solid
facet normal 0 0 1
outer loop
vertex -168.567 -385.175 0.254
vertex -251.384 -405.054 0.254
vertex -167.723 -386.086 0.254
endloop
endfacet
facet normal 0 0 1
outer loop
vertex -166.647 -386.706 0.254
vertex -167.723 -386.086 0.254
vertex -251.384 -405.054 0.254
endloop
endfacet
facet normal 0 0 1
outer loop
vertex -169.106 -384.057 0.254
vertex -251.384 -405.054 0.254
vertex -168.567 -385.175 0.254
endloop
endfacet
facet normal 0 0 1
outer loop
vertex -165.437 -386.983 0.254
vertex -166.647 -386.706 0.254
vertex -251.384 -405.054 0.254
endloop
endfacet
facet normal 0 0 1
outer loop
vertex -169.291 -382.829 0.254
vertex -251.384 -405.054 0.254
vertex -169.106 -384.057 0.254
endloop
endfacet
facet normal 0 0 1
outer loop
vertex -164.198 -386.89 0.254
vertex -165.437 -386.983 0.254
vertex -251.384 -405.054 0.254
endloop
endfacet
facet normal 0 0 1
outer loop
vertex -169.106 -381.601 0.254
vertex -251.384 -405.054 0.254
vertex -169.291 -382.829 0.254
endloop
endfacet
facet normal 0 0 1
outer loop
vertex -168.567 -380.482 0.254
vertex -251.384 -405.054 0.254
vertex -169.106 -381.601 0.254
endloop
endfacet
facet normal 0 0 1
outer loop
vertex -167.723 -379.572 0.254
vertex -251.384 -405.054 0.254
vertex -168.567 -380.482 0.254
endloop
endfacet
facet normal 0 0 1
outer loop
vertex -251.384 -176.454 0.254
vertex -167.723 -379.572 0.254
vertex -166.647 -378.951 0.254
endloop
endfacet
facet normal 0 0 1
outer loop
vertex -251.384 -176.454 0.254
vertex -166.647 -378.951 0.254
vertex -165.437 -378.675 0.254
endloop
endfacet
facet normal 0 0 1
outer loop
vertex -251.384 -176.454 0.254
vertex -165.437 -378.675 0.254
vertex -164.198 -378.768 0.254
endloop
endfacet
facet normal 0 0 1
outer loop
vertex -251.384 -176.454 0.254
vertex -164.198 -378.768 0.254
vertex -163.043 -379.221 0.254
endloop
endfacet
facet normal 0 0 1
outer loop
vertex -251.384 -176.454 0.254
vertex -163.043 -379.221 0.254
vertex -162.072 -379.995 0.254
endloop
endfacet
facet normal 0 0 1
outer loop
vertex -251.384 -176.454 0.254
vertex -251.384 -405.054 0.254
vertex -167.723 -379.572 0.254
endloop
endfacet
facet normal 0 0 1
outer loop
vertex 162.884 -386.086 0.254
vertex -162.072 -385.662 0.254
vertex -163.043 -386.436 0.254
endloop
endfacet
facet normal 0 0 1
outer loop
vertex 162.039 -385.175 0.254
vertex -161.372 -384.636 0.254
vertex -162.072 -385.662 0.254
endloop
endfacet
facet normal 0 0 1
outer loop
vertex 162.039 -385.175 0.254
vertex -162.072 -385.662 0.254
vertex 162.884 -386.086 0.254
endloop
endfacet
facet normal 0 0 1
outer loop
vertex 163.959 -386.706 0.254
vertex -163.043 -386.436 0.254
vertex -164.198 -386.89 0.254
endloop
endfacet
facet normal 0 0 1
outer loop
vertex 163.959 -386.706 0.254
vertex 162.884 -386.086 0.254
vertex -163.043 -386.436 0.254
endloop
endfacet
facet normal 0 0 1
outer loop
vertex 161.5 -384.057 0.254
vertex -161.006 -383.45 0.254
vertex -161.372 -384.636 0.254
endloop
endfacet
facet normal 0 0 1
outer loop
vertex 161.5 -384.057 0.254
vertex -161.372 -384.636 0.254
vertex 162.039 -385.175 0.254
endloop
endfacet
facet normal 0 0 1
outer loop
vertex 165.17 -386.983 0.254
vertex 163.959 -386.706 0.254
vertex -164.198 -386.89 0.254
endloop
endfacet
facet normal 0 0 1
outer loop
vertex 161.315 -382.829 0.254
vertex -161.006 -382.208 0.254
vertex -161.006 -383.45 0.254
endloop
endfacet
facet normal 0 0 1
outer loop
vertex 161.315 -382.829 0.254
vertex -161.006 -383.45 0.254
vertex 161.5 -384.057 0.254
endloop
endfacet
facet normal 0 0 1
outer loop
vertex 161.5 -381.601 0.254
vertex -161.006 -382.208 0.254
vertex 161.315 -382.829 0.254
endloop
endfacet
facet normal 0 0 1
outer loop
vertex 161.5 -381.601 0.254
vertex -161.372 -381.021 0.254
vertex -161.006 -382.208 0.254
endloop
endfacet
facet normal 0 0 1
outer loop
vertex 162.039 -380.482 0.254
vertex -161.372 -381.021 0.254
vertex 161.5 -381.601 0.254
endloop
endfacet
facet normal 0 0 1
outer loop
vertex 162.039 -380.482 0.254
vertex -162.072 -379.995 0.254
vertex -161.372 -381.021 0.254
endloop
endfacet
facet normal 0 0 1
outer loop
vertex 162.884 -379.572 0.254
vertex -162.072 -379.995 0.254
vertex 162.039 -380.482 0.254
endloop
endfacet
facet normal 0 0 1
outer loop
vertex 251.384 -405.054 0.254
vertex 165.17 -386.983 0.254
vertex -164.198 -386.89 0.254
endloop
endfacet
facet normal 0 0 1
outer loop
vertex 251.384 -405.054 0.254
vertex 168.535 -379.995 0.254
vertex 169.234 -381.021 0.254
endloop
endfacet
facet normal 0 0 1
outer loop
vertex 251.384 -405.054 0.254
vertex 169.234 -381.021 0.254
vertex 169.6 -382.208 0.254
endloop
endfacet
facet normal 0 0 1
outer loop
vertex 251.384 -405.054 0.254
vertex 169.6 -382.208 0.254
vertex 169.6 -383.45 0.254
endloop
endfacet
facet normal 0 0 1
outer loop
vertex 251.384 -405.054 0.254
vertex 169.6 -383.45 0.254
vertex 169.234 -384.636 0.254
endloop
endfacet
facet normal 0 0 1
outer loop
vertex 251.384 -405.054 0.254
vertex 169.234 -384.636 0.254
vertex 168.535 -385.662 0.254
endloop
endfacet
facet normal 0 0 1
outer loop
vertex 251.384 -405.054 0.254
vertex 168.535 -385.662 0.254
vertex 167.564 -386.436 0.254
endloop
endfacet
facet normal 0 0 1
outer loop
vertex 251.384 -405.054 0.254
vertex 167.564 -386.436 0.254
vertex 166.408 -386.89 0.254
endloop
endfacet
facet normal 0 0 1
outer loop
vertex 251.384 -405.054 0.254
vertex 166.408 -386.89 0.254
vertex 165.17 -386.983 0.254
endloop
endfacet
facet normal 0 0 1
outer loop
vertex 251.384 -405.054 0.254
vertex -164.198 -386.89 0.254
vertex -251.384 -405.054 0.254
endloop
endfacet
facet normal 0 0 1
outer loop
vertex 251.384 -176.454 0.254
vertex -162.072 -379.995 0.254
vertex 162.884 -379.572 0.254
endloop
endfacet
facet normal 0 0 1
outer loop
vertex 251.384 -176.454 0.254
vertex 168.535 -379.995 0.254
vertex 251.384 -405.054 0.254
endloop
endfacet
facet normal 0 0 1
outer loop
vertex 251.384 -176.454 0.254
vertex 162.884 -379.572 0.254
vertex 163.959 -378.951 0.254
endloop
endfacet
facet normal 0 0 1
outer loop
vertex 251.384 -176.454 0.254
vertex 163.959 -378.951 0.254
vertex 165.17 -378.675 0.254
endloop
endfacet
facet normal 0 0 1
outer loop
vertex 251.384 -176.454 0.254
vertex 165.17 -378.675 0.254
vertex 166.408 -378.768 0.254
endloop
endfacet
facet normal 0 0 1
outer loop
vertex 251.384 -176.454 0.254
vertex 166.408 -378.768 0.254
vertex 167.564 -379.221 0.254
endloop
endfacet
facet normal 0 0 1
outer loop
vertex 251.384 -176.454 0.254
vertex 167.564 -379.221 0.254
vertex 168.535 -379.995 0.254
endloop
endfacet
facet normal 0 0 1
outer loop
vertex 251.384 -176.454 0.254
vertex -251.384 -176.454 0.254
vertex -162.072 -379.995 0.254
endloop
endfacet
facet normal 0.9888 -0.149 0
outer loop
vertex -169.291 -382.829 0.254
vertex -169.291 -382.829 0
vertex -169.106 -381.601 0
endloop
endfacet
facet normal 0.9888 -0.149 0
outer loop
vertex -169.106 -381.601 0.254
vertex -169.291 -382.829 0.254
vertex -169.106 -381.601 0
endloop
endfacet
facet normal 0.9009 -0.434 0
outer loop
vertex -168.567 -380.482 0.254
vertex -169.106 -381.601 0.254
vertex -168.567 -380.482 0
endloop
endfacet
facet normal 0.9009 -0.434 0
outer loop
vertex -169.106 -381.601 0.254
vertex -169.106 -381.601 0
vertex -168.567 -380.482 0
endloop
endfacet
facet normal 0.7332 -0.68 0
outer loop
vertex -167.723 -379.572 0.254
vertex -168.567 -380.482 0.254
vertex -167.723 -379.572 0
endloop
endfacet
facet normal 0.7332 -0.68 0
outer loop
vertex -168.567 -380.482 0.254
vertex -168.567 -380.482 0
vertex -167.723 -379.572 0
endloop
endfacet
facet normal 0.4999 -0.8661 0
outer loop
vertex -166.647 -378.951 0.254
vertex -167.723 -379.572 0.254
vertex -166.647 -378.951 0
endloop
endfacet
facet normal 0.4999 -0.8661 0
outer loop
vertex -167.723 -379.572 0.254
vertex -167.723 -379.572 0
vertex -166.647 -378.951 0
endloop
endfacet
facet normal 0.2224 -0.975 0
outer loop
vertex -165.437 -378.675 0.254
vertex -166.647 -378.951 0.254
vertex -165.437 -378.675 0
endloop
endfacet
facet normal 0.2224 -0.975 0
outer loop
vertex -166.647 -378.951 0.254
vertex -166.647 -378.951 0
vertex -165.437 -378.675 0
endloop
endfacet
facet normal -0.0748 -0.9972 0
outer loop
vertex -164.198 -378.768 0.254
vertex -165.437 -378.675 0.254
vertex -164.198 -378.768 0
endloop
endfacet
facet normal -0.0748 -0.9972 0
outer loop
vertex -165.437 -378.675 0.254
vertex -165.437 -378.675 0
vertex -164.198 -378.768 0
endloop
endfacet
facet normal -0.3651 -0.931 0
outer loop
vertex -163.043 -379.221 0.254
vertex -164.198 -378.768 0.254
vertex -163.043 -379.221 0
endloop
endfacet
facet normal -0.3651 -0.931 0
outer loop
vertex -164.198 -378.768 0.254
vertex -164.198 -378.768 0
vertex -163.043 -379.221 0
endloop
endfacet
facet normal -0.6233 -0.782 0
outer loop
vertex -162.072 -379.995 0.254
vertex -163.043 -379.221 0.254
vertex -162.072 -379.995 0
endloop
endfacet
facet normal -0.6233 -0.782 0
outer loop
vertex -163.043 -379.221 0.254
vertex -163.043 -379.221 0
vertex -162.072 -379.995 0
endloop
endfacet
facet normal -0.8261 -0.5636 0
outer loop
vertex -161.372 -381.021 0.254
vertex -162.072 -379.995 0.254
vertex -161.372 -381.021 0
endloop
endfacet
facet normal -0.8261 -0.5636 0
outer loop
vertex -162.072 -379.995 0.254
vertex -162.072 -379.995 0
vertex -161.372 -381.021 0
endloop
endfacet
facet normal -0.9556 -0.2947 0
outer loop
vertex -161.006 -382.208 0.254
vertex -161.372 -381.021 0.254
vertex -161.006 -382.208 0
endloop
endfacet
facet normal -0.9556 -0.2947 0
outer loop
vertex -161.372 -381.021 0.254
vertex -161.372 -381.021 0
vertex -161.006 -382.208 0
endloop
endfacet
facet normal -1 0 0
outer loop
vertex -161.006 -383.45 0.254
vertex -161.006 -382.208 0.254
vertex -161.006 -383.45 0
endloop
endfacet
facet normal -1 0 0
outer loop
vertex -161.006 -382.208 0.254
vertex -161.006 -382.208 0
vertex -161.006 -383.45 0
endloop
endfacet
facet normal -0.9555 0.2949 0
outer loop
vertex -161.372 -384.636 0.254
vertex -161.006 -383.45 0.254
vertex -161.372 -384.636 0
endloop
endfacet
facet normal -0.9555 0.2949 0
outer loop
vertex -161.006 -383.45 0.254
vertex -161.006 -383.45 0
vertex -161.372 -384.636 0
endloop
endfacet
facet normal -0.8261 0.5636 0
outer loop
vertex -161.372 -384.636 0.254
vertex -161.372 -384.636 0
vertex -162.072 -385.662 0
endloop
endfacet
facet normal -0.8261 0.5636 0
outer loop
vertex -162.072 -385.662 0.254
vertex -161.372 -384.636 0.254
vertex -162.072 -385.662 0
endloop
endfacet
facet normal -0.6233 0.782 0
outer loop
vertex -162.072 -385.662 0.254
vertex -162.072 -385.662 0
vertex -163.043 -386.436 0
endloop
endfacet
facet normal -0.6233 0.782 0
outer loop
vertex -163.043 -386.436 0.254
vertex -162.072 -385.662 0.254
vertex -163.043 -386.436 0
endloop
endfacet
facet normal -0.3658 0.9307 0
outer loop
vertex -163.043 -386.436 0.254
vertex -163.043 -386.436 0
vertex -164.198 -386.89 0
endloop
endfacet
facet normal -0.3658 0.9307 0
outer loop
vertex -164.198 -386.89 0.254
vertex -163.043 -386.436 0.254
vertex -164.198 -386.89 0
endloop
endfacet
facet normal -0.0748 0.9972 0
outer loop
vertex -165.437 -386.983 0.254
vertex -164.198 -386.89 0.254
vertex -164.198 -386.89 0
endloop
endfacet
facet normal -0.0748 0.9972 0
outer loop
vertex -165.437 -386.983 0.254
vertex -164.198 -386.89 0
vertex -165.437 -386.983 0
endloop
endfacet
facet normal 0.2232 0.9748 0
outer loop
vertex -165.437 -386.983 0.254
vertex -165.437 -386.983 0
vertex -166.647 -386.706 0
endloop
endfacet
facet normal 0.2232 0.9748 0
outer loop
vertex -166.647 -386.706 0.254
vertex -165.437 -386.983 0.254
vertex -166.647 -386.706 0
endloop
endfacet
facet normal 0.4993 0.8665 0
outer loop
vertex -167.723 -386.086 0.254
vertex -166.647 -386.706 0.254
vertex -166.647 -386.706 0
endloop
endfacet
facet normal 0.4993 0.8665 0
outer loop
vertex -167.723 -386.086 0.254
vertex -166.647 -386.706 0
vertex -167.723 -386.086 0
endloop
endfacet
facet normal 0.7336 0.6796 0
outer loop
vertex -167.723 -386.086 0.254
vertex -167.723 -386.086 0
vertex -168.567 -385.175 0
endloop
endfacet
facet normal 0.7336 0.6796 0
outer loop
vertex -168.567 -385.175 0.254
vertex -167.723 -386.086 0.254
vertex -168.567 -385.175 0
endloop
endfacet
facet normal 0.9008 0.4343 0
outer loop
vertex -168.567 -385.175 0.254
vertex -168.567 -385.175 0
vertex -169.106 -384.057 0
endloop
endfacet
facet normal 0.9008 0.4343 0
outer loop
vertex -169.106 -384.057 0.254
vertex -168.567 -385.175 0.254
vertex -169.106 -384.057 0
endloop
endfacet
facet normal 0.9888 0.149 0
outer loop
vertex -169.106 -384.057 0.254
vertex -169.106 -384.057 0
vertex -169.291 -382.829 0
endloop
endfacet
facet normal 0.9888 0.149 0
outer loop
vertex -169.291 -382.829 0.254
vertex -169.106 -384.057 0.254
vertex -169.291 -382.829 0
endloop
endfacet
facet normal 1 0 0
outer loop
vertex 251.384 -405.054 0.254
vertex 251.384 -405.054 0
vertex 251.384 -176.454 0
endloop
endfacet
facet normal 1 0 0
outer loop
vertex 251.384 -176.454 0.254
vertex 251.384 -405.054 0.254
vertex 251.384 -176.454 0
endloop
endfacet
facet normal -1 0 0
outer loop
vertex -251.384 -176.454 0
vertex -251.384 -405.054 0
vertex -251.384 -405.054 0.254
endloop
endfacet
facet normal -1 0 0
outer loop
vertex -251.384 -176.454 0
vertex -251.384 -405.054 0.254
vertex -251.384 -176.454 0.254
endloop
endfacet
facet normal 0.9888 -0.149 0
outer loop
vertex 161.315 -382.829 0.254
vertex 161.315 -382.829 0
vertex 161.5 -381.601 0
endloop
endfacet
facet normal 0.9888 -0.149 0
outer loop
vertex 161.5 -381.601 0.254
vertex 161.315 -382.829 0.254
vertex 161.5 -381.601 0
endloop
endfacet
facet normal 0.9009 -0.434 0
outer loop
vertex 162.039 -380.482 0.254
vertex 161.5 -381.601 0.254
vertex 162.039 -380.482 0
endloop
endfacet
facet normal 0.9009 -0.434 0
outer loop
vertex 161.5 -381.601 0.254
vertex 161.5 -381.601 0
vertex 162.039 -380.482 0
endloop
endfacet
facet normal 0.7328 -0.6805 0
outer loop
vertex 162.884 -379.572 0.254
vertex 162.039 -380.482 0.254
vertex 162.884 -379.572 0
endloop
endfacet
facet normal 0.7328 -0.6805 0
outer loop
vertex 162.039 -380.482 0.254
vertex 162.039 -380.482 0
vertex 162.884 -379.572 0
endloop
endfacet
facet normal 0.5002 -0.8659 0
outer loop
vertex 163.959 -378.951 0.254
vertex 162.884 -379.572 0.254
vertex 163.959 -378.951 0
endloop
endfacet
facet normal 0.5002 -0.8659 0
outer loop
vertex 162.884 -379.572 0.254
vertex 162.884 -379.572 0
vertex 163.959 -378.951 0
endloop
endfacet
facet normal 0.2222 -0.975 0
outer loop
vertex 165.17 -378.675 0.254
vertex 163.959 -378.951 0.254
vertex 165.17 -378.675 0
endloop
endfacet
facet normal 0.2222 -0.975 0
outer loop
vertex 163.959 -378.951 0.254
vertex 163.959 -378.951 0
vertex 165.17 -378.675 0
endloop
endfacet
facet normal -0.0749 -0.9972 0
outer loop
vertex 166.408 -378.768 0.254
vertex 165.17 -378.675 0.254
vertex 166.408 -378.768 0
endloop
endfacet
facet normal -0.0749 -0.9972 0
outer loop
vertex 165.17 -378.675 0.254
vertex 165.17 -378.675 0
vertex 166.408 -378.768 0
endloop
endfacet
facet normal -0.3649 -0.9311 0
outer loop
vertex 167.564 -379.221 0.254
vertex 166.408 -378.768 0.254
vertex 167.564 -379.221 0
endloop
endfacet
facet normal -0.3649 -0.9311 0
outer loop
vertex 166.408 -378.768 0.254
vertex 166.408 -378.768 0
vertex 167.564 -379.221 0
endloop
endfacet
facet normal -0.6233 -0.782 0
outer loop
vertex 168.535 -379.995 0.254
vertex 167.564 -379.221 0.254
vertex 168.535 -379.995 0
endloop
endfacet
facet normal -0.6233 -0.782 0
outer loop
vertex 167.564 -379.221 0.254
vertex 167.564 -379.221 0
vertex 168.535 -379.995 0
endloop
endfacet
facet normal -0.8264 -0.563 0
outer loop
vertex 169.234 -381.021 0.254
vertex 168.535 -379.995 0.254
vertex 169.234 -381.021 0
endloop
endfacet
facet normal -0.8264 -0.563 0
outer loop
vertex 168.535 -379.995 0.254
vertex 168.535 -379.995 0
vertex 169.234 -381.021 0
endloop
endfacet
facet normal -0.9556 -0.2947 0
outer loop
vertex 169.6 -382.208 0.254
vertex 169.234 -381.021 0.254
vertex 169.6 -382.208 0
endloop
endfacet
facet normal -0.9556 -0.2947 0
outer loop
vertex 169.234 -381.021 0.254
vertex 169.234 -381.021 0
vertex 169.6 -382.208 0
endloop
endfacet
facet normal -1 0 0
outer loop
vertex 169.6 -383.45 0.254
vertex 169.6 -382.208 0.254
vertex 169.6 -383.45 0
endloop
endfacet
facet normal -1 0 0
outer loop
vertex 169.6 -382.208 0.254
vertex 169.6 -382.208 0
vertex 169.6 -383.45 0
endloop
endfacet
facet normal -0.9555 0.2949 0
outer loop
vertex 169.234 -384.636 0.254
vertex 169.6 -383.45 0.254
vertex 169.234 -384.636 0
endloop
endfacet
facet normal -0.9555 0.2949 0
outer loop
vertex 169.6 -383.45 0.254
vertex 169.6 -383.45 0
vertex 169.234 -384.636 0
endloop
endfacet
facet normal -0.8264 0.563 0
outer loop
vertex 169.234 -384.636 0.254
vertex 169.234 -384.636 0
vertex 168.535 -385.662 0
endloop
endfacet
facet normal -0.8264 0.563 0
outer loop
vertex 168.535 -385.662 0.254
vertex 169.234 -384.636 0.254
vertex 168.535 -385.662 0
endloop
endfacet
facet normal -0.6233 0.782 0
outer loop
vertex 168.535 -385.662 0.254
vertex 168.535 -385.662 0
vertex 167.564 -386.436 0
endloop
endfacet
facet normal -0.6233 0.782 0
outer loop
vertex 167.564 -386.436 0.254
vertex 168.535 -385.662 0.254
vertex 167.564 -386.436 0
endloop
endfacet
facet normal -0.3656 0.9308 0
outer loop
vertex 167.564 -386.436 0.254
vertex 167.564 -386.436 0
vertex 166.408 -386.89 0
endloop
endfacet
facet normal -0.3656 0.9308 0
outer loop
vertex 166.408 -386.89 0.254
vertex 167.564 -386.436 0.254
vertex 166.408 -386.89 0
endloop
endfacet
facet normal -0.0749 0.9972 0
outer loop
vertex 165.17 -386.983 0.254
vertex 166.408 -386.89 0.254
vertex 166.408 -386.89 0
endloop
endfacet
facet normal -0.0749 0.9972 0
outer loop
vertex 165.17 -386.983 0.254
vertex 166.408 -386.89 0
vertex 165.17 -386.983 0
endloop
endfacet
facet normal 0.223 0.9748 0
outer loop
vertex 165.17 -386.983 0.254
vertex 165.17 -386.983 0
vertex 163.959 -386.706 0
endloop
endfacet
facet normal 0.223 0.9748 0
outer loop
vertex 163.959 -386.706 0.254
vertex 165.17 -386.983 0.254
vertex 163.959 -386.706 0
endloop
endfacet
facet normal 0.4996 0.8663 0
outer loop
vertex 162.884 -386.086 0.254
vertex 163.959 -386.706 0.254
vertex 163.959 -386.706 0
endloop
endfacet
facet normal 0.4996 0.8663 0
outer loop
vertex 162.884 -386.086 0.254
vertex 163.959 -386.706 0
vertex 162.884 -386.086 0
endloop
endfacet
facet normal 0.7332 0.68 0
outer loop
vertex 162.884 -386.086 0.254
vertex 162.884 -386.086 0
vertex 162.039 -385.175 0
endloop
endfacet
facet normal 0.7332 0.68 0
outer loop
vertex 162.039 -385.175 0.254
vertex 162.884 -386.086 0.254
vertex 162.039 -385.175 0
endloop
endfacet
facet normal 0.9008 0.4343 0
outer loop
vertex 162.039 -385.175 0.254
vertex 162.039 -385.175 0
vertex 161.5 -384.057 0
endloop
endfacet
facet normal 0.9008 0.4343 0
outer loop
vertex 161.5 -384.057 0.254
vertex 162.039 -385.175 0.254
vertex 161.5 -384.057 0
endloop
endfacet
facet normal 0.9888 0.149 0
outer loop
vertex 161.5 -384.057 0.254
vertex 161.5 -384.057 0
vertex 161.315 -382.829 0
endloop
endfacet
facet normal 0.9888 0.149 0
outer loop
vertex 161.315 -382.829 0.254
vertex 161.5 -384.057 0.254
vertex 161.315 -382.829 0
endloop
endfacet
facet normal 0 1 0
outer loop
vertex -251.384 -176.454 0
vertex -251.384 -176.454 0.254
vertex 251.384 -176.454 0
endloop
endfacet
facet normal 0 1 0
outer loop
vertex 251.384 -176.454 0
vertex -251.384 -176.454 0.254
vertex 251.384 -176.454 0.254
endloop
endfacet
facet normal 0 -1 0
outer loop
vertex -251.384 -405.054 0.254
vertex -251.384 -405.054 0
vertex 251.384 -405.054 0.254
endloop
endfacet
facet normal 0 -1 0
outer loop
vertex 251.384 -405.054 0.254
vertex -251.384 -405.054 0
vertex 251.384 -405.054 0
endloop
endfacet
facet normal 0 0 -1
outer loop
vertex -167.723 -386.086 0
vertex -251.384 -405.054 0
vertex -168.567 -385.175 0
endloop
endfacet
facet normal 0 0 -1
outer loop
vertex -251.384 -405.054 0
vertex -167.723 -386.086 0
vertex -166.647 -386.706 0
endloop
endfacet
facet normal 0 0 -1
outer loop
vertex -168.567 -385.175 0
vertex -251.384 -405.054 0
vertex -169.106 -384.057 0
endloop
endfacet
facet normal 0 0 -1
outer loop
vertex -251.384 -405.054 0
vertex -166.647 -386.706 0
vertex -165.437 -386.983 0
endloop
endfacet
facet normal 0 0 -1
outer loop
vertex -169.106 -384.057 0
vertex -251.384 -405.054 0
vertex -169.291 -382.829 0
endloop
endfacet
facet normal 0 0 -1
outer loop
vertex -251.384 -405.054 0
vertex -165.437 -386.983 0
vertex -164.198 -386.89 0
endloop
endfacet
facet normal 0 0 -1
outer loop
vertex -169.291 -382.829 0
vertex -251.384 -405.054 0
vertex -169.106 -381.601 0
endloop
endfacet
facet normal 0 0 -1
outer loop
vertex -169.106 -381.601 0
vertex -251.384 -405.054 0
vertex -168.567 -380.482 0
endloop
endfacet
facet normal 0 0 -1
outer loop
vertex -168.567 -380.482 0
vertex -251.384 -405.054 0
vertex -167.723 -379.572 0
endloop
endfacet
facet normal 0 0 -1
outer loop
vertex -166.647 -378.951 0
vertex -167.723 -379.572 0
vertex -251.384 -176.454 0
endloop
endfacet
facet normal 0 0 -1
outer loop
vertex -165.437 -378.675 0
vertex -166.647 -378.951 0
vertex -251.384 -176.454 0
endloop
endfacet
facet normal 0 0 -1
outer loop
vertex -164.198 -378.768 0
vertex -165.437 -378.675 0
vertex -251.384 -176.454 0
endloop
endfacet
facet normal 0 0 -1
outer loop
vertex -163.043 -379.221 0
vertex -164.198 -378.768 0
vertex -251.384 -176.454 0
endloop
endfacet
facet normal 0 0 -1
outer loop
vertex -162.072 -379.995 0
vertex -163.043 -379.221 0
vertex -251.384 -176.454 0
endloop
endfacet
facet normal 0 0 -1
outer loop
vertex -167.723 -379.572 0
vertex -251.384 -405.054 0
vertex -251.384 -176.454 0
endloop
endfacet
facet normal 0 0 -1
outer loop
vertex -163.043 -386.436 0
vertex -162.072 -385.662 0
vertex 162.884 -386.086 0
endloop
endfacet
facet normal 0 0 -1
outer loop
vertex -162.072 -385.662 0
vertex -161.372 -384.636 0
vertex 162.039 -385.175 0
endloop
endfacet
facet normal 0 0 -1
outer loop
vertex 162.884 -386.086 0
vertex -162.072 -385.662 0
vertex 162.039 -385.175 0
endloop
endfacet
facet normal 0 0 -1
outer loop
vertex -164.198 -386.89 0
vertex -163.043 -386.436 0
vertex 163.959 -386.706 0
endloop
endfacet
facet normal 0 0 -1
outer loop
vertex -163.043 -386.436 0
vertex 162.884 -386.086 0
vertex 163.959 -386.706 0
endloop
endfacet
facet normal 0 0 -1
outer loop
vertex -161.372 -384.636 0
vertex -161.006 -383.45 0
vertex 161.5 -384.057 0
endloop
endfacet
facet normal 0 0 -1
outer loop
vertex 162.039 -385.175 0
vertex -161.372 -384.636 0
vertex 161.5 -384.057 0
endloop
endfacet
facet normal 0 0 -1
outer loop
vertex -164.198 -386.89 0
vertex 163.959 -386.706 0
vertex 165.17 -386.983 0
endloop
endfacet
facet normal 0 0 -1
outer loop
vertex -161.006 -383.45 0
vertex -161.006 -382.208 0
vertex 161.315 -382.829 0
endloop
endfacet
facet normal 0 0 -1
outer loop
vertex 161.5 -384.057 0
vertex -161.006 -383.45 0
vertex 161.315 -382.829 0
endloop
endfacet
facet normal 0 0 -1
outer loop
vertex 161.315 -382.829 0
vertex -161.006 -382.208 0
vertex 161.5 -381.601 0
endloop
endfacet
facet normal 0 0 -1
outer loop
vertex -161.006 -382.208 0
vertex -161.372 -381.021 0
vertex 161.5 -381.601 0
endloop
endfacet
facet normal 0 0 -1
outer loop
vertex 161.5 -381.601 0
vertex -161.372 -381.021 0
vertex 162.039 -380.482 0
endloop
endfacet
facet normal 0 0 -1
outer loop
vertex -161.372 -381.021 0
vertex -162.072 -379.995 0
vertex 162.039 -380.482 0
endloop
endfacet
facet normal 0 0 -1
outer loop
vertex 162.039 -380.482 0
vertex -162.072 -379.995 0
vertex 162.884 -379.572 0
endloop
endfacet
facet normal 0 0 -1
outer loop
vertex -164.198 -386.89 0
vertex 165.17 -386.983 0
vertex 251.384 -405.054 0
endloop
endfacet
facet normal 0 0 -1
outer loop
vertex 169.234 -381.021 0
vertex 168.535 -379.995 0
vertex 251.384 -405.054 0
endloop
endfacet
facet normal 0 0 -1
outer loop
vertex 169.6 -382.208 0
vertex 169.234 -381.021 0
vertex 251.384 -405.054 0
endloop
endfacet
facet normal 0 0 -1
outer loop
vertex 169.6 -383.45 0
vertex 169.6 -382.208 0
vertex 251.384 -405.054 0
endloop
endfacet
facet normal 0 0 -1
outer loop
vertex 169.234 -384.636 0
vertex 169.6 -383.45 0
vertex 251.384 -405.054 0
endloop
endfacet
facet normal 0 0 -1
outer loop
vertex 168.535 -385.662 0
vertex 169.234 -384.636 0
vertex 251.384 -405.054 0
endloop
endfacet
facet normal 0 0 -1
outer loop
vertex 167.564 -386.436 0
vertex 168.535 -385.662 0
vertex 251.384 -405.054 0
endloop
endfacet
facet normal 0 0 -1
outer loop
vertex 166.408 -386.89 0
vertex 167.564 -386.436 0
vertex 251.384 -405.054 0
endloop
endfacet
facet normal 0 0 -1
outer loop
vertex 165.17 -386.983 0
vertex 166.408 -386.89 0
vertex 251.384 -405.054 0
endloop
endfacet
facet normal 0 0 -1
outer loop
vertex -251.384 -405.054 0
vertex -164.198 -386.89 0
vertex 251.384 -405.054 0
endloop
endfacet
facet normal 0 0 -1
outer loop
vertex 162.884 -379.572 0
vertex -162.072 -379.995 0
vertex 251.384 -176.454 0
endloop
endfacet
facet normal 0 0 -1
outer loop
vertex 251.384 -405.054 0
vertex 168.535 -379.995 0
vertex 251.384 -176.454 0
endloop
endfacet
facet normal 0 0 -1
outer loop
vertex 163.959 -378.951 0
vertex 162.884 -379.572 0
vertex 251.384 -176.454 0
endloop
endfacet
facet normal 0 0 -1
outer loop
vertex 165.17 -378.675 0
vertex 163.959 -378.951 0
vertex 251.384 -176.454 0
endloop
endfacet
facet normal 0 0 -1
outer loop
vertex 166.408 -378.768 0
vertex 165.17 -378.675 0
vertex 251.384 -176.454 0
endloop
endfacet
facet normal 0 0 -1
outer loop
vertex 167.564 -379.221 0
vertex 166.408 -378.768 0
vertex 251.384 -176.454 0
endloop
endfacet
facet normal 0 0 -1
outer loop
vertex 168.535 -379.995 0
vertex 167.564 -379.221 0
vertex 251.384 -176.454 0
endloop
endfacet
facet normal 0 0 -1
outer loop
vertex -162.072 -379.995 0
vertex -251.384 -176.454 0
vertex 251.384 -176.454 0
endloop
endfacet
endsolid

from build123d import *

# Parameters (mm, degrees)
SKETCH1_W           = 502.7676
SKETCH1_H           = 810.1076
BOSS_EXTRUDE1_DEPTH = 0.254
SKETCH2_R           = 4.1656
CUT_EXTRUDE1_DEPTH  = 1.254
SKETCH3_W           = 502.7676
SKETCH3_H           = 581.5076
CUT_EXTRUDE2_DEPTH  = 1.254


with BuildPart() as part:
    # Sketch1 → Boss-Extrude1 (new body)
    with BuildSketch(Plane.XY):
        Rectangle(SKETCH1_W, SKETCH1_H)
    extrude(amount=BOSS_EXTRUDE1_DEPTH)

    # Sketch2 → Cut-Extrude1 (cut, through all)
    with BuildSketch(Plane(origin=(0, 0, 0), x_dir=(-1, 0, 0), z_dir=(0, 0, -1))):
        with Locations((-165.481, 395.1478)):
            Circle(SKETCH2_R)
        with Locations((165.1254, 395.1478)):
            Circle(SKETCH2_R)
        with Locations((165.1254, -382.8288)):
            Circle(SKETCH2_R)
        with Locations((-165.481, -382.8288)):
            Circle(SKETCH2_R)
    extrude(amount=-CUT_EXTRUDE1_DEPTH, mode=Mode.SUBTRACT)

    # Sketch3 → Cut-Extrude2 (cut, through all)
    with BuildSketch(Plane.XY.offset(0.254)):
        with Locations((0, 114.3)):
            Rectangle(SKETCH3_W, SKETCH3_H)
    extrude(amount=-CUT_EXTRUDE2_DEPTH, mode=Mode.SUBTRACT)


solid = part.part
